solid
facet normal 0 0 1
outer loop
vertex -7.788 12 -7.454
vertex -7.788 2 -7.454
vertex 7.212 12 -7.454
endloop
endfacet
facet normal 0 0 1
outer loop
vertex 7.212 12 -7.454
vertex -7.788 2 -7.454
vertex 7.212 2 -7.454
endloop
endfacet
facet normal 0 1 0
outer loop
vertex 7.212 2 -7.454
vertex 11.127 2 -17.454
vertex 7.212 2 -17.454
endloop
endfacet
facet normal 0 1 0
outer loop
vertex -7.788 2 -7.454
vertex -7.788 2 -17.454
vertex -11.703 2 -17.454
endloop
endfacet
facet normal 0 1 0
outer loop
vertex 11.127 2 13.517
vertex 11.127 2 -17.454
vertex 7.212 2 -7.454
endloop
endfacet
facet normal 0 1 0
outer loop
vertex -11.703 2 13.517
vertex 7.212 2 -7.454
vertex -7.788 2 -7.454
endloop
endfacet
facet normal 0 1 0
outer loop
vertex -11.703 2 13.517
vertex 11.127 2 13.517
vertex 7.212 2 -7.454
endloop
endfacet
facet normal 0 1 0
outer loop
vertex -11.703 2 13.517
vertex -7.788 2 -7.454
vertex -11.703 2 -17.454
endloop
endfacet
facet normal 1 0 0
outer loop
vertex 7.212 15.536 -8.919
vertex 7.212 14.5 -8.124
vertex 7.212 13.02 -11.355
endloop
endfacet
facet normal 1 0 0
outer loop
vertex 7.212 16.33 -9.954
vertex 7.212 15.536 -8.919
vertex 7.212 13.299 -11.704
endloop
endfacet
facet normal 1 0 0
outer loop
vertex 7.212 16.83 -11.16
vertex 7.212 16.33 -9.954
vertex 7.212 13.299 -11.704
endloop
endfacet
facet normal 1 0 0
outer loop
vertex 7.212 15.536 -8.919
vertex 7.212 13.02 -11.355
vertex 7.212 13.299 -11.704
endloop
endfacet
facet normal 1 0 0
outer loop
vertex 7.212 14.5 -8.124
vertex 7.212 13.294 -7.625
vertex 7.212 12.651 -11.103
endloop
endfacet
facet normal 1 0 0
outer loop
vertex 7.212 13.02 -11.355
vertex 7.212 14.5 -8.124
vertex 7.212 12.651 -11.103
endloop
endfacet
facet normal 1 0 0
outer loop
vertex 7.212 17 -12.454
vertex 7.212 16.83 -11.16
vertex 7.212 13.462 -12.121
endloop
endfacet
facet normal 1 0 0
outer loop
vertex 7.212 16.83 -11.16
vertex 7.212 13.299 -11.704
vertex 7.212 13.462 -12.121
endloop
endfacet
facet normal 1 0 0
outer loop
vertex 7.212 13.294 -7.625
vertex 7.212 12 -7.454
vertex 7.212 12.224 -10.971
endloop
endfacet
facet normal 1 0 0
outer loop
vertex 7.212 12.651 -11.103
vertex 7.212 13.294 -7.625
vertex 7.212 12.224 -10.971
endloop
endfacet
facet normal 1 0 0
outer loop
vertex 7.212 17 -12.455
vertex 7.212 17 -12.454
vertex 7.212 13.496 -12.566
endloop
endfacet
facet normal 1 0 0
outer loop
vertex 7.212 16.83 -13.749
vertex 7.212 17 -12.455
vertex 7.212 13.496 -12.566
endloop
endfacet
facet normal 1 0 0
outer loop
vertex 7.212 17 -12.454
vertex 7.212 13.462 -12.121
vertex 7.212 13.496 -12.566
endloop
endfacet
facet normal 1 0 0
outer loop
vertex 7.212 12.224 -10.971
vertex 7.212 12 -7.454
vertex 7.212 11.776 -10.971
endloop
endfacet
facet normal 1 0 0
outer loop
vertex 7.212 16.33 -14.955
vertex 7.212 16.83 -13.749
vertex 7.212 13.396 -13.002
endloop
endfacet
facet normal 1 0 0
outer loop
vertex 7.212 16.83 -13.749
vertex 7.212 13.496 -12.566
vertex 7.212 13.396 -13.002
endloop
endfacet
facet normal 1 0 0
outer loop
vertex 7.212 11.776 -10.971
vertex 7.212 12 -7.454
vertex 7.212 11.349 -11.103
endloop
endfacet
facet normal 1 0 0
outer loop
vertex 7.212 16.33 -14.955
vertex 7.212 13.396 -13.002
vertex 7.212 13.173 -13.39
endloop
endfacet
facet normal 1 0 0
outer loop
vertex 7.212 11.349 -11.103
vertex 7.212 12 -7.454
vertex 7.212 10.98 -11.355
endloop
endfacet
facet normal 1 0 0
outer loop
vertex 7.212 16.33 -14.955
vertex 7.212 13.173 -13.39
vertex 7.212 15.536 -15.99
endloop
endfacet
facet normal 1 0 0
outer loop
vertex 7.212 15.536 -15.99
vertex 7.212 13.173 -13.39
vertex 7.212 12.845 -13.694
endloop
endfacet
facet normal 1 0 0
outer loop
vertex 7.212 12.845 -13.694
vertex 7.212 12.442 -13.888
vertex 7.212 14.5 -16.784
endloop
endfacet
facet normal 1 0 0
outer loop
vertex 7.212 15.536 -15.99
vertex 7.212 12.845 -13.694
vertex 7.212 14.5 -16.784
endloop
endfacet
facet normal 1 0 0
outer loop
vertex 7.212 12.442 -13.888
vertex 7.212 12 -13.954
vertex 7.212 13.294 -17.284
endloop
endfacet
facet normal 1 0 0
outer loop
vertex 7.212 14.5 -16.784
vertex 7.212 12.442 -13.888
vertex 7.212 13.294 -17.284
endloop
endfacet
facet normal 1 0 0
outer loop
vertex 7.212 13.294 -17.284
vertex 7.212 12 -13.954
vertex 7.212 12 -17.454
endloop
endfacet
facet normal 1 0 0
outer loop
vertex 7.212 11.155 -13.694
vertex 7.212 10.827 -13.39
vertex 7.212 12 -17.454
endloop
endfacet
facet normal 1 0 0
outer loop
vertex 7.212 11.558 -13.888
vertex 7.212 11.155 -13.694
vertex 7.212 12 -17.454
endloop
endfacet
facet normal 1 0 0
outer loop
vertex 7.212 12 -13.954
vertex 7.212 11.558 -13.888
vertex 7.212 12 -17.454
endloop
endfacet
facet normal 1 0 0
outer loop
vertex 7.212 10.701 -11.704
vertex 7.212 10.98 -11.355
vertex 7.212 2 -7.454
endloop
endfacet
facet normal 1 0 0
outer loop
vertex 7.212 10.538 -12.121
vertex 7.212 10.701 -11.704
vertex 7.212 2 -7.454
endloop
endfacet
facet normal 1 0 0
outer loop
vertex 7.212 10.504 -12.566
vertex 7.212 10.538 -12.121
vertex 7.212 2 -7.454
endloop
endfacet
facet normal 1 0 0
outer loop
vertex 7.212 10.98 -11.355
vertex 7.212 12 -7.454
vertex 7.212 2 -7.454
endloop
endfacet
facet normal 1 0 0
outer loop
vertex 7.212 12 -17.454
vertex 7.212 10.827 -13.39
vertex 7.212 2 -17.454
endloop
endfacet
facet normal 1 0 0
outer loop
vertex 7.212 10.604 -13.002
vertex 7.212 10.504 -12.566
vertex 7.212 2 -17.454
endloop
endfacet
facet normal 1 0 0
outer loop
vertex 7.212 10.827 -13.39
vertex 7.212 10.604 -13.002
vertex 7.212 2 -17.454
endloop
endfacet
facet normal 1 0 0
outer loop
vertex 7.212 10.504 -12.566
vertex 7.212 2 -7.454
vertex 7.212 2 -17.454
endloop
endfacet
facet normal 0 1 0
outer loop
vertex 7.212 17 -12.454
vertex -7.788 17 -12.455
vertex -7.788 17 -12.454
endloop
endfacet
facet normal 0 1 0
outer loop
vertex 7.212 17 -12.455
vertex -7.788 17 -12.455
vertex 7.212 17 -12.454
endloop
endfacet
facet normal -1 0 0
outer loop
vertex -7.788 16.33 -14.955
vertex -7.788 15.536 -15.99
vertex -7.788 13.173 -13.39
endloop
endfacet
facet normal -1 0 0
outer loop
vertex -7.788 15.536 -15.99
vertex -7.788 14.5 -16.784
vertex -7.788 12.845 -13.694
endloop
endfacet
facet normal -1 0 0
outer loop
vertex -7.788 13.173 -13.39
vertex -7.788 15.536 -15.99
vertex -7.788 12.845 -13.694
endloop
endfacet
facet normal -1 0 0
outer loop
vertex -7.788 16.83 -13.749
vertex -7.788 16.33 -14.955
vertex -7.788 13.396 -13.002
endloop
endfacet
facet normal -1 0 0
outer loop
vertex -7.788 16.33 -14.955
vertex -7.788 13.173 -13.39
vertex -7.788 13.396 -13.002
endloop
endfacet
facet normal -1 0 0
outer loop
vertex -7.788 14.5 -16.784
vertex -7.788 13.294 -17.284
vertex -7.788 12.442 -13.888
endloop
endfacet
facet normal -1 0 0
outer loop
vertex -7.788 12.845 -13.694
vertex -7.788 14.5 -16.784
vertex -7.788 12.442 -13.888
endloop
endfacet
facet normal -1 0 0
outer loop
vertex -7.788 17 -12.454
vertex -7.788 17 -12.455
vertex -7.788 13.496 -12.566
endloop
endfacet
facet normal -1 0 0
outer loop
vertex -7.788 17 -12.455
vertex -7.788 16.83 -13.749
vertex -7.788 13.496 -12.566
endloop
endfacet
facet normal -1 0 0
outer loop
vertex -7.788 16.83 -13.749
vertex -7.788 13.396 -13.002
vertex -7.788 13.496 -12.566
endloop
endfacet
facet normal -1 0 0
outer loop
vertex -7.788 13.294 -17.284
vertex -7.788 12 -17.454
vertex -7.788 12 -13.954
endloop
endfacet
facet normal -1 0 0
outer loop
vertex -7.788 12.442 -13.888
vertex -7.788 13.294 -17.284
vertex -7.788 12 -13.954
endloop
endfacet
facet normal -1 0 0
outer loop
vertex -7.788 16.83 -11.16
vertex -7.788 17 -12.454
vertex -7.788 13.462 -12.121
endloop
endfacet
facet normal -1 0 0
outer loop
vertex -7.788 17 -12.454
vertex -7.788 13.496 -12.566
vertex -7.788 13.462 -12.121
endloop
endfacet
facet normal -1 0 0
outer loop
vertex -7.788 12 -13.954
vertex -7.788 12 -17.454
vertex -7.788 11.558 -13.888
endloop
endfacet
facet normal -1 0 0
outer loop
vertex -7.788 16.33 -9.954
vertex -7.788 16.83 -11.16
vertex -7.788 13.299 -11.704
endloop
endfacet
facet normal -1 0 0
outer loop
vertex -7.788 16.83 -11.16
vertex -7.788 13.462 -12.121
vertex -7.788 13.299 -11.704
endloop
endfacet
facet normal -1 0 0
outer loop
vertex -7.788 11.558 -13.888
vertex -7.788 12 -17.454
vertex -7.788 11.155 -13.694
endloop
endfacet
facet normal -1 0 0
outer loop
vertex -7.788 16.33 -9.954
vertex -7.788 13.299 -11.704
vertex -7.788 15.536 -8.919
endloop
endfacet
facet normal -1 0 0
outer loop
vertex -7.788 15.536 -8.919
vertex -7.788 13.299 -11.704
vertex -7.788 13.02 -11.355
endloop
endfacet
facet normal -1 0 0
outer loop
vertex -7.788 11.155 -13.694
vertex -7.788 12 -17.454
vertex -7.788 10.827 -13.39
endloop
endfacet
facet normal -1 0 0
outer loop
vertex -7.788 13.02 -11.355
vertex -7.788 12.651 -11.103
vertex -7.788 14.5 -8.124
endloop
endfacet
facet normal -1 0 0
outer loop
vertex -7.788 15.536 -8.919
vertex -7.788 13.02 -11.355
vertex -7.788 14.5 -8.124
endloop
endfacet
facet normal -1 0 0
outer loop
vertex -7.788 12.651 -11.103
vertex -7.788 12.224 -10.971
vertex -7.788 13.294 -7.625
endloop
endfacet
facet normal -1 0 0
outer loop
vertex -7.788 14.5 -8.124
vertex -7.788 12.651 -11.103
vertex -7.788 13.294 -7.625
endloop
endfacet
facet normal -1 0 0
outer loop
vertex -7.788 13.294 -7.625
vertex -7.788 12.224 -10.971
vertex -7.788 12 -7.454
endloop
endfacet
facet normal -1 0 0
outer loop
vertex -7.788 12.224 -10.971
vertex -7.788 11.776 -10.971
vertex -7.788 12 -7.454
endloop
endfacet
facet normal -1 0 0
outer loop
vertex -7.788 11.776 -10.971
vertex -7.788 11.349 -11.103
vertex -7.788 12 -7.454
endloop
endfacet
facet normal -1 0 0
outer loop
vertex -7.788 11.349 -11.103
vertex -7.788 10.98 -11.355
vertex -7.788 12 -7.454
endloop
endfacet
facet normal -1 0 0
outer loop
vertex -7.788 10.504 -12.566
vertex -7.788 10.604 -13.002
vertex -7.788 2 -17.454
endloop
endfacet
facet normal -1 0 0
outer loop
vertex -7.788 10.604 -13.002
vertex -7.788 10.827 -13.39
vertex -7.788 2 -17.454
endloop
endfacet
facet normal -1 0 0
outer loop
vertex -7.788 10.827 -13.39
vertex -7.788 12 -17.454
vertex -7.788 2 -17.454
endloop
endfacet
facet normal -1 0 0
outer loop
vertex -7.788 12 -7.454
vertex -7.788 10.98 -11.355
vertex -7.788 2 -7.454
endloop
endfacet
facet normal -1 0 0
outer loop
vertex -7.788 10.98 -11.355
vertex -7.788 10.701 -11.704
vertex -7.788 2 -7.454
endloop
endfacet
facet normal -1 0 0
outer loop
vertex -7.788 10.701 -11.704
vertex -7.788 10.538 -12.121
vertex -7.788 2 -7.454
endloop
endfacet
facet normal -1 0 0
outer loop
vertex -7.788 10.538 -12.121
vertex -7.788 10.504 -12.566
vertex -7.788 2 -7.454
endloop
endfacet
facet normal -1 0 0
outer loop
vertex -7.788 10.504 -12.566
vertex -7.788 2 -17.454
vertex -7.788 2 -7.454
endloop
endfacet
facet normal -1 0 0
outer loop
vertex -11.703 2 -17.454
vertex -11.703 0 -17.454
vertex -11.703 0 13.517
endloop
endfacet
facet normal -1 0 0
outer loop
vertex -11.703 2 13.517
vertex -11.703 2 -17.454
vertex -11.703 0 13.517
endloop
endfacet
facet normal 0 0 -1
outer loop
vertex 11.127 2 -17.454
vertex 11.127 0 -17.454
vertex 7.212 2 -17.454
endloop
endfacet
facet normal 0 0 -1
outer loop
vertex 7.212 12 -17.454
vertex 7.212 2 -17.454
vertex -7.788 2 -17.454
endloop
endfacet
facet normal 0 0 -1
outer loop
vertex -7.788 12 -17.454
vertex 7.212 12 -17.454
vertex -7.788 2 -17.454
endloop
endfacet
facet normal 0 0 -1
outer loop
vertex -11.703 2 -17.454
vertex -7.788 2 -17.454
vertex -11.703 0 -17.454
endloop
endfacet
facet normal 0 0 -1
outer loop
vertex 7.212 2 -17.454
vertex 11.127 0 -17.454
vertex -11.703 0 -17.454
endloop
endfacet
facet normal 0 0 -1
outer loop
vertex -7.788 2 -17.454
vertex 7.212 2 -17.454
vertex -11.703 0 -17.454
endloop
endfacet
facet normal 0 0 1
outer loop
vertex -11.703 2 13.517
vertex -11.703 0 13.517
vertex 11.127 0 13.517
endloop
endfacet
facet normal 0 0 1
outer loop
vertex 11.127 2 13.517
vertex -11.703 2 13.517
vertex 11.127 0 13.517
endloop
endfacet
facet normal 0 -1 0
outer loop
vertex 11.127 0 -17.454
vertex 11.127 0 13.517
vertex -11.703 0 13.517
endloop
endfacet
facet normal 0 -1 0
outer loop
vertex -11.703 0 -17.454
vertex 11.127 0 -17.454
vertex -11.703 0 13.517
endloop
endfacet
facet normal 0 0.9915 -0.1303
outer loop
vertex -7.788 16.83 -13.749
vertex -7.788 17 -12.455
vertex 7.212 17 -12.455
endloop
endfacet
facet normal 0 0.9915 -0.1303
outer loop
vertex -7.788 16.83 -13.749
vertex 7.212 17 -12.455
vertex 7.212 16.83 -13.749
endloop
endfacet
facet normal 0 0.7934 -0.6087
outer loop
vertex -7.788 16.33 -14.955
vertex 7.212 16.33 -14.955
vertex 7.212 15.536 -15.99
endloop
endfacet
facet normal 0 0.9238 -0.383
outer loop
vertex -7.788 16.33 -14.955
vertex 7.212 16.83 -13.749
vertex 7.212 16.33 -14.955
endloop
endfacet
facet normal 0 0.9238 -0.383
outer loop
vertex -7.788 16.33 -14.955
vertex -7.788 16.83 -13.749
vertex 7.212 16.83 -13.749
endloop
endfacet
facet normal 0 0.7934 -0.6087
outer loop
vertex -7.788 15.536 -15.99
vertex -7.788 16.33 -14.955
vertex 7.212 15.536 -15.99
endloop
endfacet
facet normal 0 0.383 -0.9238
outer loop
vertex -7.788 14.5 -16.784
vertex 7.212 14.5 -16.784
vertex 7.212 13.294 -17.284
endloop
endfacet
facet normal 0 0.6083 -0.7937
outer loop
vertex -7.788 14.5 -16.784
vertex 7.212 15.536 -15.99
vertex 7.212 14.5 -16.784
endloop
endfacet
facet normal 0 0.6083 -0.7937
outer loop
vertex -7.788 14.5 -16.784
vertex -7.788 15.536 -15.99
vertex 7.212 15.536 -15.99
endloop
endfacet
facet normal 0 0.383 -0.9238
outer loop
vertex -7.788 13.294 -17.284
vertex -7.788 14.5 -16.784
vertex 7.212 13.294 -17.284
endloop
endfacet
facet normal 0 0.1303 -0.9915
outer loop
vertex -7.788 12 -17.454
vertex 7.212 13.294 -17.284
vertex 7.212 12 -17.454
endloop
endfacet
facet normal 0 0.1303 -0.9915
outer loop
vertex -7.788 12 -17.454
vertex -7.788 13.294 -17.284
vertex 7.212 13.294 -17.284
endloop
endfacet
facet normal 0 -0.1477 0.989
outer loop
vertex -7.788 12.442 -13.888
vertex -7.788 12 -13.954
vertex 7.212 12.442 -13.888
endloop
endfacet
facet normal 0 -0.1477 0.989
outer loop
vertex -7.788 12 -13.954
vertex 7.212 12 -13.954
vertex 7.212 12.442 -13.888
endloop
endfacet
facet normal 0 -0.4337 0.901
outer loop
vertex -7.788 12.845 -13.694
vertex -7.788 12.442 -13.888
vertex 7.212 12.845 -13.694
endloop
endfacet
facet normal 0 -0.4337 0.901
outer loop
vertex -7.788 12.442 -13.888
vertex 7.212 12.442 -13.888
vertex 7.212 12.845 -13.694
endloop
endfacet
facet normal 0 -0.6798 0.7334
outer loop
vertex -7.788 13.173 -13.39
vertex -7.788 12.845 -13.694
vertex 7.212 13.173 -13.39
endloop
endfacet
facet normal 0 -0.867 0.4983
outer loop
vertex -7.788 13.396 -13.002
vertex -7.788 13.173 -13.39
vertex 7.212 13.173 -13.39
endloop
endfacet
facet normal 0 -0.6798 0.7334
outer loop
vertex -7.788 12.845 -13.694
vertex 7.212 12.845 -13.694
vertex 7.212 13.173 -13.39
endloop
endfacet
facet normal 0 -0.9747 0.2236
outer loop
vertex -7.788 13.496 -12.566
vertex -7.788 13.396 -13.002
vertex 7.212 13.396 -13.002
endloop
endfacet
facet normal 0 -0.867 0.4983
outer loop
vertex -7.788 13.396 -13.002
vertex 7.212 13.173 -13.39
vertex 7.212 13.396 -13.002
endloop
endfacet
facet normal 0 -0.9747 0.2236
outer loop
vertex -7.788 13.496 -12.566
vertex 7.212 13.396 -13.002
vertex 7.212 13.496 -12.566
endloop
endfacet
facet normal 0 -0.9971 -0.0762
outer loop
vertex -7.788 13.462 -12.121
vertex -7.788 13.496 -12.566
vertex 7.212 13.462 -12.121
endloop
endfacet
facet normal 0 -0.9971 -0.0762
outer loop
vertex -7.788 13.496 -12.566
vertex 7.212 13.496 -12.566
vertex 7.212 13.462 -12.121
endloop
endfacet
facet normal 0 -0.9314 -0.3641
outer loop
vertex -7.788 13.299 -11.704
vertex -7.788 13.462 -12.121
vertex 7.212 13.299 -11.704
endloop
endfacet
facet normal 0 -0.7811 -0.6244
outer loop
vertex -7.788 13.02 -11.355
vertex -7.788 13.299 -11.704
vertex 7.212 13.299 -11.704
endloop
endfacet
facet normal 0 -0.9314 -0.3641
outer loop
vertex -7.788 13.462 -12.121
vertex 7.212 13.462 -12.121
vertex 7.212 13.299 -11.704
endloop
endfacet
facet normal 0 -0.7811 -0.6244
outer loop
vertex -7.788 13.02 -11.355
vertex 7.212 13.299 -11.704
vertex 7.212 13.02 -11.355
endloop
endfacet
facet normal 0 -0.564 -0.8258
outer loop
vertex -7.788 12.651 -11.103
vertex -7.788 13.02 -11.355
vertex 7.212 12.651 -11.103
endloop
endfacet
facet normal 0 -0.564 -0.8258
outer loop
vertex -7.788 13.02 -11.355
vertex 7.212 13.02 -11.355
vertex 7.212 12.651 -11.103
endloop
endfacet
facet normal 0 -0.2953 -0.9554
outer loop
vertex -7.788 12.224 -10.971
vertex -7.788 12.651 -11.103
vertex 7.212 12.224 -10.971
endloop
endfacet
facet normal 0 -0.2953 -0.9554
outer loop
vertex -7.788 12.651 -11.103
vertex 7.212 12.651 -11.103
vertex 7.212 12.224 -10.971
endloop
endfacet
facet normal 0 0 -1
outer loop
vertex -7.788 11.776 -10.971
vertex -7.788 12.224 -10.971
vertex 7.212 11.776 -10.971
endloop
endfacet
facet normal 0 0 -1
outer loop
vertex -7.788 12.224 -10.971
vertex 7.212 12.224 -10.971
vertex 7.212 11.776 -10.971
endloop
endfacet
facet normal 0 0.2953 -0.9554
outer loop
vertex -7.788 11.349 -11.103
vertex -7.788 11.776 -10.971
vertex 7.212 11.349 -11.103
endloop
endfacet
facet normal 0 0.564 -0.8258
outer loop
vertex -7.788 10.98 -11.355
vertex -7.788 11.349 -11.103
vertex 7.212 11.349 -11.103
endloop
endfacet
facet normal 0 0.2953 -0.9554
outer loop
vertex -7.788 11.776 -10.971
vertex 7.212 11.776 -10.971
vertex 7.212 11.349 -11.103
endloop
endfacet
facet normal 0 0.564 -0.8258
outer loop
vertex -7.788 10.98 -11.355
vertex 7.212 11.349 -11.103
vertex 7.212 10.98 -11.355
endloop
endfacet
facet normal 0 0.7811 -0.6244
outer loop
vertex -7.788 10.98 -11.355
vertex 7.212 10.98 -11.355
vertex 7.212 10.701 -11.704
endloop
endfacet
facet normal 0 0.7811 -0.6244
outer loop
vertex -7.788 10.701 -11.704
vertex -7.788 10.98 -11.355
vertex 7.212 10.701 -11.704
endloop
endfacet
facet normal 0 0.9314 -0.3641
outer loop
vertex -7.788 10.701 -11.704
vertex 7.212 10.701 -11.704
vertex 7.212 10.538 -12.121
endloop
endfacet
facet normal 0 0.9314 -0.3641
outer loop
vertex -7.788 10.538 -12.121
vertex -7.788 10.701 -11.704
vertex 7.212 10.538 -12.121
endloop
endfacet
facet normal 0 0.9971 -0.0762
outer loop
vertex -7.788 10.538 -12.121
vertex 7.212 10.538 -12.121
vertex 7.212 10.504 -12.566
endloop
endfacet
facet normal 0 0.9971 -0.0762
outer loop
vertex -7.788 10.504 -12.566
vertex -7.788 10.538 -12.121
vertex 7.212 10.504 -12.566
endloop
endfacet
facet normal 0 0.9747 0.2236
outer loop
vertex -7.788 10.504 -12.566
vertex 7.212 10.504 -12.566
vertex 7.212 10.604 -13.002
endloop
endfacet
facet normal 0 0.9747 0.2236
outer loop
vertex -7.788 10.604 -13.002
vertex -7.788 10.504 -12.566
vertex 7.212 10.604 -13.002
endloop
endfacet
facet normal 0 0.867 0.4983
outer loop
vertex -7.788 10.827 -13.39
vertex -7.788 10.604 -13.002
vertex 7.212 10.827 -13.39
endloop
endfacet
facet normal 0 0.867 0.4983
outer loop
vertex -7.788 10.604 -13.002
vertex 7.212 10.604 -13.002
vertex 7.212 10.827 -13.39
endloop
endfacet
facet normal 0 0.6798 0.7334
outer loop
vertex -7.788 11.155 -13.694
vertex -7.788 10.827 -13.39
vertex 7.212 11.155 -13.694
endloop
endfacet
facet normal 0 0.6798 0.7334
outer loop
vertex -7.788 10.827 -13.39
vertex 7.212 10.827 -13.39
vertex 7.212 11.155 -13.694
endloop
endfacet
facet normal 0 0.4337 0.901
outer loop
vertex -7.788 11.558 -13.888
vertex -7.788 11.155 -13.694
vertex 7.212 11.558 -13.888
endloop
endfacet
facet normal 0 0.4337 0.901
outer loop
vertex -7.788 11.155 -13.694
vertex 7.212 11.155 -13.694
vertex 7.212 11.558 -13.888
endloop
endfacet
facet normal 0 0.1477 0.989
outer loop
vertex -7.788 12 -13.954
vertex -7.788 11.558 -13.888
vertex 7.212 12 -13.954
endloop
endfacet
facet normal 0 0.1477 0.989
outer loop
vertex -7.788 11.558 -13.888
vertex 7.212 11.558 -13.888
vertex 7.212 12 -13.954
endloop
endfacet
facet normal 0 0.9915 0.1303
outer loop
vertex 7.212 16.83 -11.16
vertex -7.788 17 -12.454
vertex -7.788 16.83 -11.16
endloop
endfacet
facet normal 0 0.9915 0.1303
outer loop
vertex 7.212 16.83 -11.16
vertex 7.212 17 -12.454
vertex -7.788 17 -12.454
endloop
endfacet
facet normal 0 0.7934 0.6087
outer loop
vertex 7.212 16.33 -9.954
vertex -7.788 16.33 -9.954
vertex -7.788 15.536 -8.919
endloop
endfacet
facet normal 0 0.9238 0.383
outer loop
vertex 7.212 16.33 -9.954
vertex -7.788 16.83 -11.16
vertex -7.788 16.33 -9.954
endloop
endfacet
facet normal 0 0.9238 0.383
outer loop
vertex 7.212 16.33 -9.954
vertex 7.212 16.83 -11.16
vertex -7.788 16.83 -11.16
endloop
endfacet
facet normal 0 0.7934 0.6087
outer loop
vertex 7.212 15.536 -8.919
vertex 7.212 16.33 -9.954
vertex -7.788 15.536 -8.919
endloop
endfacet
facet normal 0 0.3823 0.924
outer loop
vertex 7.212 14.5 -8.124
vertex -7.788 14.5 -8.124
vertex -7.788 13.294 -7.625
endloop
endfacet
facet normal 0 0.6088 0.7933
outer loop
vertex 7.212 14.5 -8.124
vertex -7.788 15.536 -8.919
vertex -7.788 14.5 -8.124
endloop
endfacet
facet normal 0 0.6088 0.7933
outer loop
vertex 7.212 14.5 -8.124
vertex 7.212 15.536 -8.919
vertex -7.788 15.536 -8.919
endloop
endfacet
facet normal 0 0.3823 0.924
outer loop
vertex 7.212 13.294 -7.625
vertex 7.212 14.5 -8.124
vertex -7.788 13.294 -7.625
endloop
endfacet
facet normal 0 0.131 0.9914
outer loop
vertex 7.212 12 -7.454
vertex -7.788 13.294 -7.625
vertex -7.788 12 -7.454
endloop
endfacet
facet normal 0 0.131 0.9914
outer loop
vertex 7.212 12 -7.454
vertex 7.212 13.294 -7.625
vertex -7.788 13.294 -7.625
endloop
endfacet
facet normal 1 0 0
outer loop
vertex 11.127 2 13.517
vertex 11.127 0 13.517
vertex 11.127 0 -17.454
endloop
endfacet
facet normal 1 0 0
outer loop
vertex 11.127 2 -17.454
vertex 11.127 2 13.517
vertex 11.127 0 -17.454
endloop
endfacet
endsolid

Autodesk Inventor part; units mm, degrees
ref_plane "YZ Plane" through (0, 0, 0) normal (1, 0, 0) x (0, 1, 0)
ref_plane "XZ Plane" through (0, 0, 0) normal (0, 1, 0) x (-1, 0, 0)
ref_plane "XY Plane" through (0, 0, 0) normal (0, 0, 1) x (1, 0, 0)
sketch "Szkic1" plane through (0, 0, 0) normal (0, 1, 0) x (-1, 0, 0)
  line L0 (11.7026, 13.5166) -> (-11.1274, 13.5166)
  line L1 (-11.1274, 13.5166) -> (-11.1274, -17.4543)
  line L2 (-11.1274, -17.4543) -> (11.7026, -17.4543)
  line L3 (11.7026, -17.4543) -> (11.7026, 13.5166)
  point P0 (0, 0)
extrude "Wyciągnięcie proste1" add sketch "Szkic1" along normal blind 2
sketch "Szkic2" plane through (0, 2, 0) normal (0, 1, 0) x (1, 0, 0)
  line L0 (11.1274, 17.4543) -> (-11.7026, 17.4543) projected
  line L1 (-7.7876, 7.4543) -> (7.2124, 7.4543)
  line L2 (7.2124, 7.4543) -> (7.2124, 17.4543)
  line L3 (7.2124, 17.4543) -> (-7.7876, 17.4543)
  line L4 (-7.7876, 17.4543) -> (-7.7876, 7.4543)
  point P0 (0, 0)
  point P1 (-0.2876, 7.4543)
  point P2 (-0.2876, 17.4543)
  dimension "d2" = 15
  dimension "d3" = 10
extrude "Wyciągnięcie proste2" add sketch "Szkic2" along normal blind 15
fillet "Zaokrąglenie1" radius 5 2 edges at (-0.2876, 17, -7.4543) (-0.2876, 17, -17.4543)
sketch "Szkic3" plane through (7.2124, 2, -7.4543) normal (1, 0, 0) x (0, 0, -1)
  arc A0 (10, 10) -> (0, 10) centre (5, 10) ccw projected
  line L0 (0, 0) -> (0, 10) projected
  line L1 (10, 0) -> (0, 0) projected
  line L2 (10, 0) -> (10, 10) projected
  circle A1 centre (5, 10) radius 1.5
  point P0 (-7.4543, -2)
  dimension "d7" = 3
extrude "Wyciągnięcie proste3" cut sketch "Szkic3" against normal blind 15 contours A1
properties part number "uchwyt"
